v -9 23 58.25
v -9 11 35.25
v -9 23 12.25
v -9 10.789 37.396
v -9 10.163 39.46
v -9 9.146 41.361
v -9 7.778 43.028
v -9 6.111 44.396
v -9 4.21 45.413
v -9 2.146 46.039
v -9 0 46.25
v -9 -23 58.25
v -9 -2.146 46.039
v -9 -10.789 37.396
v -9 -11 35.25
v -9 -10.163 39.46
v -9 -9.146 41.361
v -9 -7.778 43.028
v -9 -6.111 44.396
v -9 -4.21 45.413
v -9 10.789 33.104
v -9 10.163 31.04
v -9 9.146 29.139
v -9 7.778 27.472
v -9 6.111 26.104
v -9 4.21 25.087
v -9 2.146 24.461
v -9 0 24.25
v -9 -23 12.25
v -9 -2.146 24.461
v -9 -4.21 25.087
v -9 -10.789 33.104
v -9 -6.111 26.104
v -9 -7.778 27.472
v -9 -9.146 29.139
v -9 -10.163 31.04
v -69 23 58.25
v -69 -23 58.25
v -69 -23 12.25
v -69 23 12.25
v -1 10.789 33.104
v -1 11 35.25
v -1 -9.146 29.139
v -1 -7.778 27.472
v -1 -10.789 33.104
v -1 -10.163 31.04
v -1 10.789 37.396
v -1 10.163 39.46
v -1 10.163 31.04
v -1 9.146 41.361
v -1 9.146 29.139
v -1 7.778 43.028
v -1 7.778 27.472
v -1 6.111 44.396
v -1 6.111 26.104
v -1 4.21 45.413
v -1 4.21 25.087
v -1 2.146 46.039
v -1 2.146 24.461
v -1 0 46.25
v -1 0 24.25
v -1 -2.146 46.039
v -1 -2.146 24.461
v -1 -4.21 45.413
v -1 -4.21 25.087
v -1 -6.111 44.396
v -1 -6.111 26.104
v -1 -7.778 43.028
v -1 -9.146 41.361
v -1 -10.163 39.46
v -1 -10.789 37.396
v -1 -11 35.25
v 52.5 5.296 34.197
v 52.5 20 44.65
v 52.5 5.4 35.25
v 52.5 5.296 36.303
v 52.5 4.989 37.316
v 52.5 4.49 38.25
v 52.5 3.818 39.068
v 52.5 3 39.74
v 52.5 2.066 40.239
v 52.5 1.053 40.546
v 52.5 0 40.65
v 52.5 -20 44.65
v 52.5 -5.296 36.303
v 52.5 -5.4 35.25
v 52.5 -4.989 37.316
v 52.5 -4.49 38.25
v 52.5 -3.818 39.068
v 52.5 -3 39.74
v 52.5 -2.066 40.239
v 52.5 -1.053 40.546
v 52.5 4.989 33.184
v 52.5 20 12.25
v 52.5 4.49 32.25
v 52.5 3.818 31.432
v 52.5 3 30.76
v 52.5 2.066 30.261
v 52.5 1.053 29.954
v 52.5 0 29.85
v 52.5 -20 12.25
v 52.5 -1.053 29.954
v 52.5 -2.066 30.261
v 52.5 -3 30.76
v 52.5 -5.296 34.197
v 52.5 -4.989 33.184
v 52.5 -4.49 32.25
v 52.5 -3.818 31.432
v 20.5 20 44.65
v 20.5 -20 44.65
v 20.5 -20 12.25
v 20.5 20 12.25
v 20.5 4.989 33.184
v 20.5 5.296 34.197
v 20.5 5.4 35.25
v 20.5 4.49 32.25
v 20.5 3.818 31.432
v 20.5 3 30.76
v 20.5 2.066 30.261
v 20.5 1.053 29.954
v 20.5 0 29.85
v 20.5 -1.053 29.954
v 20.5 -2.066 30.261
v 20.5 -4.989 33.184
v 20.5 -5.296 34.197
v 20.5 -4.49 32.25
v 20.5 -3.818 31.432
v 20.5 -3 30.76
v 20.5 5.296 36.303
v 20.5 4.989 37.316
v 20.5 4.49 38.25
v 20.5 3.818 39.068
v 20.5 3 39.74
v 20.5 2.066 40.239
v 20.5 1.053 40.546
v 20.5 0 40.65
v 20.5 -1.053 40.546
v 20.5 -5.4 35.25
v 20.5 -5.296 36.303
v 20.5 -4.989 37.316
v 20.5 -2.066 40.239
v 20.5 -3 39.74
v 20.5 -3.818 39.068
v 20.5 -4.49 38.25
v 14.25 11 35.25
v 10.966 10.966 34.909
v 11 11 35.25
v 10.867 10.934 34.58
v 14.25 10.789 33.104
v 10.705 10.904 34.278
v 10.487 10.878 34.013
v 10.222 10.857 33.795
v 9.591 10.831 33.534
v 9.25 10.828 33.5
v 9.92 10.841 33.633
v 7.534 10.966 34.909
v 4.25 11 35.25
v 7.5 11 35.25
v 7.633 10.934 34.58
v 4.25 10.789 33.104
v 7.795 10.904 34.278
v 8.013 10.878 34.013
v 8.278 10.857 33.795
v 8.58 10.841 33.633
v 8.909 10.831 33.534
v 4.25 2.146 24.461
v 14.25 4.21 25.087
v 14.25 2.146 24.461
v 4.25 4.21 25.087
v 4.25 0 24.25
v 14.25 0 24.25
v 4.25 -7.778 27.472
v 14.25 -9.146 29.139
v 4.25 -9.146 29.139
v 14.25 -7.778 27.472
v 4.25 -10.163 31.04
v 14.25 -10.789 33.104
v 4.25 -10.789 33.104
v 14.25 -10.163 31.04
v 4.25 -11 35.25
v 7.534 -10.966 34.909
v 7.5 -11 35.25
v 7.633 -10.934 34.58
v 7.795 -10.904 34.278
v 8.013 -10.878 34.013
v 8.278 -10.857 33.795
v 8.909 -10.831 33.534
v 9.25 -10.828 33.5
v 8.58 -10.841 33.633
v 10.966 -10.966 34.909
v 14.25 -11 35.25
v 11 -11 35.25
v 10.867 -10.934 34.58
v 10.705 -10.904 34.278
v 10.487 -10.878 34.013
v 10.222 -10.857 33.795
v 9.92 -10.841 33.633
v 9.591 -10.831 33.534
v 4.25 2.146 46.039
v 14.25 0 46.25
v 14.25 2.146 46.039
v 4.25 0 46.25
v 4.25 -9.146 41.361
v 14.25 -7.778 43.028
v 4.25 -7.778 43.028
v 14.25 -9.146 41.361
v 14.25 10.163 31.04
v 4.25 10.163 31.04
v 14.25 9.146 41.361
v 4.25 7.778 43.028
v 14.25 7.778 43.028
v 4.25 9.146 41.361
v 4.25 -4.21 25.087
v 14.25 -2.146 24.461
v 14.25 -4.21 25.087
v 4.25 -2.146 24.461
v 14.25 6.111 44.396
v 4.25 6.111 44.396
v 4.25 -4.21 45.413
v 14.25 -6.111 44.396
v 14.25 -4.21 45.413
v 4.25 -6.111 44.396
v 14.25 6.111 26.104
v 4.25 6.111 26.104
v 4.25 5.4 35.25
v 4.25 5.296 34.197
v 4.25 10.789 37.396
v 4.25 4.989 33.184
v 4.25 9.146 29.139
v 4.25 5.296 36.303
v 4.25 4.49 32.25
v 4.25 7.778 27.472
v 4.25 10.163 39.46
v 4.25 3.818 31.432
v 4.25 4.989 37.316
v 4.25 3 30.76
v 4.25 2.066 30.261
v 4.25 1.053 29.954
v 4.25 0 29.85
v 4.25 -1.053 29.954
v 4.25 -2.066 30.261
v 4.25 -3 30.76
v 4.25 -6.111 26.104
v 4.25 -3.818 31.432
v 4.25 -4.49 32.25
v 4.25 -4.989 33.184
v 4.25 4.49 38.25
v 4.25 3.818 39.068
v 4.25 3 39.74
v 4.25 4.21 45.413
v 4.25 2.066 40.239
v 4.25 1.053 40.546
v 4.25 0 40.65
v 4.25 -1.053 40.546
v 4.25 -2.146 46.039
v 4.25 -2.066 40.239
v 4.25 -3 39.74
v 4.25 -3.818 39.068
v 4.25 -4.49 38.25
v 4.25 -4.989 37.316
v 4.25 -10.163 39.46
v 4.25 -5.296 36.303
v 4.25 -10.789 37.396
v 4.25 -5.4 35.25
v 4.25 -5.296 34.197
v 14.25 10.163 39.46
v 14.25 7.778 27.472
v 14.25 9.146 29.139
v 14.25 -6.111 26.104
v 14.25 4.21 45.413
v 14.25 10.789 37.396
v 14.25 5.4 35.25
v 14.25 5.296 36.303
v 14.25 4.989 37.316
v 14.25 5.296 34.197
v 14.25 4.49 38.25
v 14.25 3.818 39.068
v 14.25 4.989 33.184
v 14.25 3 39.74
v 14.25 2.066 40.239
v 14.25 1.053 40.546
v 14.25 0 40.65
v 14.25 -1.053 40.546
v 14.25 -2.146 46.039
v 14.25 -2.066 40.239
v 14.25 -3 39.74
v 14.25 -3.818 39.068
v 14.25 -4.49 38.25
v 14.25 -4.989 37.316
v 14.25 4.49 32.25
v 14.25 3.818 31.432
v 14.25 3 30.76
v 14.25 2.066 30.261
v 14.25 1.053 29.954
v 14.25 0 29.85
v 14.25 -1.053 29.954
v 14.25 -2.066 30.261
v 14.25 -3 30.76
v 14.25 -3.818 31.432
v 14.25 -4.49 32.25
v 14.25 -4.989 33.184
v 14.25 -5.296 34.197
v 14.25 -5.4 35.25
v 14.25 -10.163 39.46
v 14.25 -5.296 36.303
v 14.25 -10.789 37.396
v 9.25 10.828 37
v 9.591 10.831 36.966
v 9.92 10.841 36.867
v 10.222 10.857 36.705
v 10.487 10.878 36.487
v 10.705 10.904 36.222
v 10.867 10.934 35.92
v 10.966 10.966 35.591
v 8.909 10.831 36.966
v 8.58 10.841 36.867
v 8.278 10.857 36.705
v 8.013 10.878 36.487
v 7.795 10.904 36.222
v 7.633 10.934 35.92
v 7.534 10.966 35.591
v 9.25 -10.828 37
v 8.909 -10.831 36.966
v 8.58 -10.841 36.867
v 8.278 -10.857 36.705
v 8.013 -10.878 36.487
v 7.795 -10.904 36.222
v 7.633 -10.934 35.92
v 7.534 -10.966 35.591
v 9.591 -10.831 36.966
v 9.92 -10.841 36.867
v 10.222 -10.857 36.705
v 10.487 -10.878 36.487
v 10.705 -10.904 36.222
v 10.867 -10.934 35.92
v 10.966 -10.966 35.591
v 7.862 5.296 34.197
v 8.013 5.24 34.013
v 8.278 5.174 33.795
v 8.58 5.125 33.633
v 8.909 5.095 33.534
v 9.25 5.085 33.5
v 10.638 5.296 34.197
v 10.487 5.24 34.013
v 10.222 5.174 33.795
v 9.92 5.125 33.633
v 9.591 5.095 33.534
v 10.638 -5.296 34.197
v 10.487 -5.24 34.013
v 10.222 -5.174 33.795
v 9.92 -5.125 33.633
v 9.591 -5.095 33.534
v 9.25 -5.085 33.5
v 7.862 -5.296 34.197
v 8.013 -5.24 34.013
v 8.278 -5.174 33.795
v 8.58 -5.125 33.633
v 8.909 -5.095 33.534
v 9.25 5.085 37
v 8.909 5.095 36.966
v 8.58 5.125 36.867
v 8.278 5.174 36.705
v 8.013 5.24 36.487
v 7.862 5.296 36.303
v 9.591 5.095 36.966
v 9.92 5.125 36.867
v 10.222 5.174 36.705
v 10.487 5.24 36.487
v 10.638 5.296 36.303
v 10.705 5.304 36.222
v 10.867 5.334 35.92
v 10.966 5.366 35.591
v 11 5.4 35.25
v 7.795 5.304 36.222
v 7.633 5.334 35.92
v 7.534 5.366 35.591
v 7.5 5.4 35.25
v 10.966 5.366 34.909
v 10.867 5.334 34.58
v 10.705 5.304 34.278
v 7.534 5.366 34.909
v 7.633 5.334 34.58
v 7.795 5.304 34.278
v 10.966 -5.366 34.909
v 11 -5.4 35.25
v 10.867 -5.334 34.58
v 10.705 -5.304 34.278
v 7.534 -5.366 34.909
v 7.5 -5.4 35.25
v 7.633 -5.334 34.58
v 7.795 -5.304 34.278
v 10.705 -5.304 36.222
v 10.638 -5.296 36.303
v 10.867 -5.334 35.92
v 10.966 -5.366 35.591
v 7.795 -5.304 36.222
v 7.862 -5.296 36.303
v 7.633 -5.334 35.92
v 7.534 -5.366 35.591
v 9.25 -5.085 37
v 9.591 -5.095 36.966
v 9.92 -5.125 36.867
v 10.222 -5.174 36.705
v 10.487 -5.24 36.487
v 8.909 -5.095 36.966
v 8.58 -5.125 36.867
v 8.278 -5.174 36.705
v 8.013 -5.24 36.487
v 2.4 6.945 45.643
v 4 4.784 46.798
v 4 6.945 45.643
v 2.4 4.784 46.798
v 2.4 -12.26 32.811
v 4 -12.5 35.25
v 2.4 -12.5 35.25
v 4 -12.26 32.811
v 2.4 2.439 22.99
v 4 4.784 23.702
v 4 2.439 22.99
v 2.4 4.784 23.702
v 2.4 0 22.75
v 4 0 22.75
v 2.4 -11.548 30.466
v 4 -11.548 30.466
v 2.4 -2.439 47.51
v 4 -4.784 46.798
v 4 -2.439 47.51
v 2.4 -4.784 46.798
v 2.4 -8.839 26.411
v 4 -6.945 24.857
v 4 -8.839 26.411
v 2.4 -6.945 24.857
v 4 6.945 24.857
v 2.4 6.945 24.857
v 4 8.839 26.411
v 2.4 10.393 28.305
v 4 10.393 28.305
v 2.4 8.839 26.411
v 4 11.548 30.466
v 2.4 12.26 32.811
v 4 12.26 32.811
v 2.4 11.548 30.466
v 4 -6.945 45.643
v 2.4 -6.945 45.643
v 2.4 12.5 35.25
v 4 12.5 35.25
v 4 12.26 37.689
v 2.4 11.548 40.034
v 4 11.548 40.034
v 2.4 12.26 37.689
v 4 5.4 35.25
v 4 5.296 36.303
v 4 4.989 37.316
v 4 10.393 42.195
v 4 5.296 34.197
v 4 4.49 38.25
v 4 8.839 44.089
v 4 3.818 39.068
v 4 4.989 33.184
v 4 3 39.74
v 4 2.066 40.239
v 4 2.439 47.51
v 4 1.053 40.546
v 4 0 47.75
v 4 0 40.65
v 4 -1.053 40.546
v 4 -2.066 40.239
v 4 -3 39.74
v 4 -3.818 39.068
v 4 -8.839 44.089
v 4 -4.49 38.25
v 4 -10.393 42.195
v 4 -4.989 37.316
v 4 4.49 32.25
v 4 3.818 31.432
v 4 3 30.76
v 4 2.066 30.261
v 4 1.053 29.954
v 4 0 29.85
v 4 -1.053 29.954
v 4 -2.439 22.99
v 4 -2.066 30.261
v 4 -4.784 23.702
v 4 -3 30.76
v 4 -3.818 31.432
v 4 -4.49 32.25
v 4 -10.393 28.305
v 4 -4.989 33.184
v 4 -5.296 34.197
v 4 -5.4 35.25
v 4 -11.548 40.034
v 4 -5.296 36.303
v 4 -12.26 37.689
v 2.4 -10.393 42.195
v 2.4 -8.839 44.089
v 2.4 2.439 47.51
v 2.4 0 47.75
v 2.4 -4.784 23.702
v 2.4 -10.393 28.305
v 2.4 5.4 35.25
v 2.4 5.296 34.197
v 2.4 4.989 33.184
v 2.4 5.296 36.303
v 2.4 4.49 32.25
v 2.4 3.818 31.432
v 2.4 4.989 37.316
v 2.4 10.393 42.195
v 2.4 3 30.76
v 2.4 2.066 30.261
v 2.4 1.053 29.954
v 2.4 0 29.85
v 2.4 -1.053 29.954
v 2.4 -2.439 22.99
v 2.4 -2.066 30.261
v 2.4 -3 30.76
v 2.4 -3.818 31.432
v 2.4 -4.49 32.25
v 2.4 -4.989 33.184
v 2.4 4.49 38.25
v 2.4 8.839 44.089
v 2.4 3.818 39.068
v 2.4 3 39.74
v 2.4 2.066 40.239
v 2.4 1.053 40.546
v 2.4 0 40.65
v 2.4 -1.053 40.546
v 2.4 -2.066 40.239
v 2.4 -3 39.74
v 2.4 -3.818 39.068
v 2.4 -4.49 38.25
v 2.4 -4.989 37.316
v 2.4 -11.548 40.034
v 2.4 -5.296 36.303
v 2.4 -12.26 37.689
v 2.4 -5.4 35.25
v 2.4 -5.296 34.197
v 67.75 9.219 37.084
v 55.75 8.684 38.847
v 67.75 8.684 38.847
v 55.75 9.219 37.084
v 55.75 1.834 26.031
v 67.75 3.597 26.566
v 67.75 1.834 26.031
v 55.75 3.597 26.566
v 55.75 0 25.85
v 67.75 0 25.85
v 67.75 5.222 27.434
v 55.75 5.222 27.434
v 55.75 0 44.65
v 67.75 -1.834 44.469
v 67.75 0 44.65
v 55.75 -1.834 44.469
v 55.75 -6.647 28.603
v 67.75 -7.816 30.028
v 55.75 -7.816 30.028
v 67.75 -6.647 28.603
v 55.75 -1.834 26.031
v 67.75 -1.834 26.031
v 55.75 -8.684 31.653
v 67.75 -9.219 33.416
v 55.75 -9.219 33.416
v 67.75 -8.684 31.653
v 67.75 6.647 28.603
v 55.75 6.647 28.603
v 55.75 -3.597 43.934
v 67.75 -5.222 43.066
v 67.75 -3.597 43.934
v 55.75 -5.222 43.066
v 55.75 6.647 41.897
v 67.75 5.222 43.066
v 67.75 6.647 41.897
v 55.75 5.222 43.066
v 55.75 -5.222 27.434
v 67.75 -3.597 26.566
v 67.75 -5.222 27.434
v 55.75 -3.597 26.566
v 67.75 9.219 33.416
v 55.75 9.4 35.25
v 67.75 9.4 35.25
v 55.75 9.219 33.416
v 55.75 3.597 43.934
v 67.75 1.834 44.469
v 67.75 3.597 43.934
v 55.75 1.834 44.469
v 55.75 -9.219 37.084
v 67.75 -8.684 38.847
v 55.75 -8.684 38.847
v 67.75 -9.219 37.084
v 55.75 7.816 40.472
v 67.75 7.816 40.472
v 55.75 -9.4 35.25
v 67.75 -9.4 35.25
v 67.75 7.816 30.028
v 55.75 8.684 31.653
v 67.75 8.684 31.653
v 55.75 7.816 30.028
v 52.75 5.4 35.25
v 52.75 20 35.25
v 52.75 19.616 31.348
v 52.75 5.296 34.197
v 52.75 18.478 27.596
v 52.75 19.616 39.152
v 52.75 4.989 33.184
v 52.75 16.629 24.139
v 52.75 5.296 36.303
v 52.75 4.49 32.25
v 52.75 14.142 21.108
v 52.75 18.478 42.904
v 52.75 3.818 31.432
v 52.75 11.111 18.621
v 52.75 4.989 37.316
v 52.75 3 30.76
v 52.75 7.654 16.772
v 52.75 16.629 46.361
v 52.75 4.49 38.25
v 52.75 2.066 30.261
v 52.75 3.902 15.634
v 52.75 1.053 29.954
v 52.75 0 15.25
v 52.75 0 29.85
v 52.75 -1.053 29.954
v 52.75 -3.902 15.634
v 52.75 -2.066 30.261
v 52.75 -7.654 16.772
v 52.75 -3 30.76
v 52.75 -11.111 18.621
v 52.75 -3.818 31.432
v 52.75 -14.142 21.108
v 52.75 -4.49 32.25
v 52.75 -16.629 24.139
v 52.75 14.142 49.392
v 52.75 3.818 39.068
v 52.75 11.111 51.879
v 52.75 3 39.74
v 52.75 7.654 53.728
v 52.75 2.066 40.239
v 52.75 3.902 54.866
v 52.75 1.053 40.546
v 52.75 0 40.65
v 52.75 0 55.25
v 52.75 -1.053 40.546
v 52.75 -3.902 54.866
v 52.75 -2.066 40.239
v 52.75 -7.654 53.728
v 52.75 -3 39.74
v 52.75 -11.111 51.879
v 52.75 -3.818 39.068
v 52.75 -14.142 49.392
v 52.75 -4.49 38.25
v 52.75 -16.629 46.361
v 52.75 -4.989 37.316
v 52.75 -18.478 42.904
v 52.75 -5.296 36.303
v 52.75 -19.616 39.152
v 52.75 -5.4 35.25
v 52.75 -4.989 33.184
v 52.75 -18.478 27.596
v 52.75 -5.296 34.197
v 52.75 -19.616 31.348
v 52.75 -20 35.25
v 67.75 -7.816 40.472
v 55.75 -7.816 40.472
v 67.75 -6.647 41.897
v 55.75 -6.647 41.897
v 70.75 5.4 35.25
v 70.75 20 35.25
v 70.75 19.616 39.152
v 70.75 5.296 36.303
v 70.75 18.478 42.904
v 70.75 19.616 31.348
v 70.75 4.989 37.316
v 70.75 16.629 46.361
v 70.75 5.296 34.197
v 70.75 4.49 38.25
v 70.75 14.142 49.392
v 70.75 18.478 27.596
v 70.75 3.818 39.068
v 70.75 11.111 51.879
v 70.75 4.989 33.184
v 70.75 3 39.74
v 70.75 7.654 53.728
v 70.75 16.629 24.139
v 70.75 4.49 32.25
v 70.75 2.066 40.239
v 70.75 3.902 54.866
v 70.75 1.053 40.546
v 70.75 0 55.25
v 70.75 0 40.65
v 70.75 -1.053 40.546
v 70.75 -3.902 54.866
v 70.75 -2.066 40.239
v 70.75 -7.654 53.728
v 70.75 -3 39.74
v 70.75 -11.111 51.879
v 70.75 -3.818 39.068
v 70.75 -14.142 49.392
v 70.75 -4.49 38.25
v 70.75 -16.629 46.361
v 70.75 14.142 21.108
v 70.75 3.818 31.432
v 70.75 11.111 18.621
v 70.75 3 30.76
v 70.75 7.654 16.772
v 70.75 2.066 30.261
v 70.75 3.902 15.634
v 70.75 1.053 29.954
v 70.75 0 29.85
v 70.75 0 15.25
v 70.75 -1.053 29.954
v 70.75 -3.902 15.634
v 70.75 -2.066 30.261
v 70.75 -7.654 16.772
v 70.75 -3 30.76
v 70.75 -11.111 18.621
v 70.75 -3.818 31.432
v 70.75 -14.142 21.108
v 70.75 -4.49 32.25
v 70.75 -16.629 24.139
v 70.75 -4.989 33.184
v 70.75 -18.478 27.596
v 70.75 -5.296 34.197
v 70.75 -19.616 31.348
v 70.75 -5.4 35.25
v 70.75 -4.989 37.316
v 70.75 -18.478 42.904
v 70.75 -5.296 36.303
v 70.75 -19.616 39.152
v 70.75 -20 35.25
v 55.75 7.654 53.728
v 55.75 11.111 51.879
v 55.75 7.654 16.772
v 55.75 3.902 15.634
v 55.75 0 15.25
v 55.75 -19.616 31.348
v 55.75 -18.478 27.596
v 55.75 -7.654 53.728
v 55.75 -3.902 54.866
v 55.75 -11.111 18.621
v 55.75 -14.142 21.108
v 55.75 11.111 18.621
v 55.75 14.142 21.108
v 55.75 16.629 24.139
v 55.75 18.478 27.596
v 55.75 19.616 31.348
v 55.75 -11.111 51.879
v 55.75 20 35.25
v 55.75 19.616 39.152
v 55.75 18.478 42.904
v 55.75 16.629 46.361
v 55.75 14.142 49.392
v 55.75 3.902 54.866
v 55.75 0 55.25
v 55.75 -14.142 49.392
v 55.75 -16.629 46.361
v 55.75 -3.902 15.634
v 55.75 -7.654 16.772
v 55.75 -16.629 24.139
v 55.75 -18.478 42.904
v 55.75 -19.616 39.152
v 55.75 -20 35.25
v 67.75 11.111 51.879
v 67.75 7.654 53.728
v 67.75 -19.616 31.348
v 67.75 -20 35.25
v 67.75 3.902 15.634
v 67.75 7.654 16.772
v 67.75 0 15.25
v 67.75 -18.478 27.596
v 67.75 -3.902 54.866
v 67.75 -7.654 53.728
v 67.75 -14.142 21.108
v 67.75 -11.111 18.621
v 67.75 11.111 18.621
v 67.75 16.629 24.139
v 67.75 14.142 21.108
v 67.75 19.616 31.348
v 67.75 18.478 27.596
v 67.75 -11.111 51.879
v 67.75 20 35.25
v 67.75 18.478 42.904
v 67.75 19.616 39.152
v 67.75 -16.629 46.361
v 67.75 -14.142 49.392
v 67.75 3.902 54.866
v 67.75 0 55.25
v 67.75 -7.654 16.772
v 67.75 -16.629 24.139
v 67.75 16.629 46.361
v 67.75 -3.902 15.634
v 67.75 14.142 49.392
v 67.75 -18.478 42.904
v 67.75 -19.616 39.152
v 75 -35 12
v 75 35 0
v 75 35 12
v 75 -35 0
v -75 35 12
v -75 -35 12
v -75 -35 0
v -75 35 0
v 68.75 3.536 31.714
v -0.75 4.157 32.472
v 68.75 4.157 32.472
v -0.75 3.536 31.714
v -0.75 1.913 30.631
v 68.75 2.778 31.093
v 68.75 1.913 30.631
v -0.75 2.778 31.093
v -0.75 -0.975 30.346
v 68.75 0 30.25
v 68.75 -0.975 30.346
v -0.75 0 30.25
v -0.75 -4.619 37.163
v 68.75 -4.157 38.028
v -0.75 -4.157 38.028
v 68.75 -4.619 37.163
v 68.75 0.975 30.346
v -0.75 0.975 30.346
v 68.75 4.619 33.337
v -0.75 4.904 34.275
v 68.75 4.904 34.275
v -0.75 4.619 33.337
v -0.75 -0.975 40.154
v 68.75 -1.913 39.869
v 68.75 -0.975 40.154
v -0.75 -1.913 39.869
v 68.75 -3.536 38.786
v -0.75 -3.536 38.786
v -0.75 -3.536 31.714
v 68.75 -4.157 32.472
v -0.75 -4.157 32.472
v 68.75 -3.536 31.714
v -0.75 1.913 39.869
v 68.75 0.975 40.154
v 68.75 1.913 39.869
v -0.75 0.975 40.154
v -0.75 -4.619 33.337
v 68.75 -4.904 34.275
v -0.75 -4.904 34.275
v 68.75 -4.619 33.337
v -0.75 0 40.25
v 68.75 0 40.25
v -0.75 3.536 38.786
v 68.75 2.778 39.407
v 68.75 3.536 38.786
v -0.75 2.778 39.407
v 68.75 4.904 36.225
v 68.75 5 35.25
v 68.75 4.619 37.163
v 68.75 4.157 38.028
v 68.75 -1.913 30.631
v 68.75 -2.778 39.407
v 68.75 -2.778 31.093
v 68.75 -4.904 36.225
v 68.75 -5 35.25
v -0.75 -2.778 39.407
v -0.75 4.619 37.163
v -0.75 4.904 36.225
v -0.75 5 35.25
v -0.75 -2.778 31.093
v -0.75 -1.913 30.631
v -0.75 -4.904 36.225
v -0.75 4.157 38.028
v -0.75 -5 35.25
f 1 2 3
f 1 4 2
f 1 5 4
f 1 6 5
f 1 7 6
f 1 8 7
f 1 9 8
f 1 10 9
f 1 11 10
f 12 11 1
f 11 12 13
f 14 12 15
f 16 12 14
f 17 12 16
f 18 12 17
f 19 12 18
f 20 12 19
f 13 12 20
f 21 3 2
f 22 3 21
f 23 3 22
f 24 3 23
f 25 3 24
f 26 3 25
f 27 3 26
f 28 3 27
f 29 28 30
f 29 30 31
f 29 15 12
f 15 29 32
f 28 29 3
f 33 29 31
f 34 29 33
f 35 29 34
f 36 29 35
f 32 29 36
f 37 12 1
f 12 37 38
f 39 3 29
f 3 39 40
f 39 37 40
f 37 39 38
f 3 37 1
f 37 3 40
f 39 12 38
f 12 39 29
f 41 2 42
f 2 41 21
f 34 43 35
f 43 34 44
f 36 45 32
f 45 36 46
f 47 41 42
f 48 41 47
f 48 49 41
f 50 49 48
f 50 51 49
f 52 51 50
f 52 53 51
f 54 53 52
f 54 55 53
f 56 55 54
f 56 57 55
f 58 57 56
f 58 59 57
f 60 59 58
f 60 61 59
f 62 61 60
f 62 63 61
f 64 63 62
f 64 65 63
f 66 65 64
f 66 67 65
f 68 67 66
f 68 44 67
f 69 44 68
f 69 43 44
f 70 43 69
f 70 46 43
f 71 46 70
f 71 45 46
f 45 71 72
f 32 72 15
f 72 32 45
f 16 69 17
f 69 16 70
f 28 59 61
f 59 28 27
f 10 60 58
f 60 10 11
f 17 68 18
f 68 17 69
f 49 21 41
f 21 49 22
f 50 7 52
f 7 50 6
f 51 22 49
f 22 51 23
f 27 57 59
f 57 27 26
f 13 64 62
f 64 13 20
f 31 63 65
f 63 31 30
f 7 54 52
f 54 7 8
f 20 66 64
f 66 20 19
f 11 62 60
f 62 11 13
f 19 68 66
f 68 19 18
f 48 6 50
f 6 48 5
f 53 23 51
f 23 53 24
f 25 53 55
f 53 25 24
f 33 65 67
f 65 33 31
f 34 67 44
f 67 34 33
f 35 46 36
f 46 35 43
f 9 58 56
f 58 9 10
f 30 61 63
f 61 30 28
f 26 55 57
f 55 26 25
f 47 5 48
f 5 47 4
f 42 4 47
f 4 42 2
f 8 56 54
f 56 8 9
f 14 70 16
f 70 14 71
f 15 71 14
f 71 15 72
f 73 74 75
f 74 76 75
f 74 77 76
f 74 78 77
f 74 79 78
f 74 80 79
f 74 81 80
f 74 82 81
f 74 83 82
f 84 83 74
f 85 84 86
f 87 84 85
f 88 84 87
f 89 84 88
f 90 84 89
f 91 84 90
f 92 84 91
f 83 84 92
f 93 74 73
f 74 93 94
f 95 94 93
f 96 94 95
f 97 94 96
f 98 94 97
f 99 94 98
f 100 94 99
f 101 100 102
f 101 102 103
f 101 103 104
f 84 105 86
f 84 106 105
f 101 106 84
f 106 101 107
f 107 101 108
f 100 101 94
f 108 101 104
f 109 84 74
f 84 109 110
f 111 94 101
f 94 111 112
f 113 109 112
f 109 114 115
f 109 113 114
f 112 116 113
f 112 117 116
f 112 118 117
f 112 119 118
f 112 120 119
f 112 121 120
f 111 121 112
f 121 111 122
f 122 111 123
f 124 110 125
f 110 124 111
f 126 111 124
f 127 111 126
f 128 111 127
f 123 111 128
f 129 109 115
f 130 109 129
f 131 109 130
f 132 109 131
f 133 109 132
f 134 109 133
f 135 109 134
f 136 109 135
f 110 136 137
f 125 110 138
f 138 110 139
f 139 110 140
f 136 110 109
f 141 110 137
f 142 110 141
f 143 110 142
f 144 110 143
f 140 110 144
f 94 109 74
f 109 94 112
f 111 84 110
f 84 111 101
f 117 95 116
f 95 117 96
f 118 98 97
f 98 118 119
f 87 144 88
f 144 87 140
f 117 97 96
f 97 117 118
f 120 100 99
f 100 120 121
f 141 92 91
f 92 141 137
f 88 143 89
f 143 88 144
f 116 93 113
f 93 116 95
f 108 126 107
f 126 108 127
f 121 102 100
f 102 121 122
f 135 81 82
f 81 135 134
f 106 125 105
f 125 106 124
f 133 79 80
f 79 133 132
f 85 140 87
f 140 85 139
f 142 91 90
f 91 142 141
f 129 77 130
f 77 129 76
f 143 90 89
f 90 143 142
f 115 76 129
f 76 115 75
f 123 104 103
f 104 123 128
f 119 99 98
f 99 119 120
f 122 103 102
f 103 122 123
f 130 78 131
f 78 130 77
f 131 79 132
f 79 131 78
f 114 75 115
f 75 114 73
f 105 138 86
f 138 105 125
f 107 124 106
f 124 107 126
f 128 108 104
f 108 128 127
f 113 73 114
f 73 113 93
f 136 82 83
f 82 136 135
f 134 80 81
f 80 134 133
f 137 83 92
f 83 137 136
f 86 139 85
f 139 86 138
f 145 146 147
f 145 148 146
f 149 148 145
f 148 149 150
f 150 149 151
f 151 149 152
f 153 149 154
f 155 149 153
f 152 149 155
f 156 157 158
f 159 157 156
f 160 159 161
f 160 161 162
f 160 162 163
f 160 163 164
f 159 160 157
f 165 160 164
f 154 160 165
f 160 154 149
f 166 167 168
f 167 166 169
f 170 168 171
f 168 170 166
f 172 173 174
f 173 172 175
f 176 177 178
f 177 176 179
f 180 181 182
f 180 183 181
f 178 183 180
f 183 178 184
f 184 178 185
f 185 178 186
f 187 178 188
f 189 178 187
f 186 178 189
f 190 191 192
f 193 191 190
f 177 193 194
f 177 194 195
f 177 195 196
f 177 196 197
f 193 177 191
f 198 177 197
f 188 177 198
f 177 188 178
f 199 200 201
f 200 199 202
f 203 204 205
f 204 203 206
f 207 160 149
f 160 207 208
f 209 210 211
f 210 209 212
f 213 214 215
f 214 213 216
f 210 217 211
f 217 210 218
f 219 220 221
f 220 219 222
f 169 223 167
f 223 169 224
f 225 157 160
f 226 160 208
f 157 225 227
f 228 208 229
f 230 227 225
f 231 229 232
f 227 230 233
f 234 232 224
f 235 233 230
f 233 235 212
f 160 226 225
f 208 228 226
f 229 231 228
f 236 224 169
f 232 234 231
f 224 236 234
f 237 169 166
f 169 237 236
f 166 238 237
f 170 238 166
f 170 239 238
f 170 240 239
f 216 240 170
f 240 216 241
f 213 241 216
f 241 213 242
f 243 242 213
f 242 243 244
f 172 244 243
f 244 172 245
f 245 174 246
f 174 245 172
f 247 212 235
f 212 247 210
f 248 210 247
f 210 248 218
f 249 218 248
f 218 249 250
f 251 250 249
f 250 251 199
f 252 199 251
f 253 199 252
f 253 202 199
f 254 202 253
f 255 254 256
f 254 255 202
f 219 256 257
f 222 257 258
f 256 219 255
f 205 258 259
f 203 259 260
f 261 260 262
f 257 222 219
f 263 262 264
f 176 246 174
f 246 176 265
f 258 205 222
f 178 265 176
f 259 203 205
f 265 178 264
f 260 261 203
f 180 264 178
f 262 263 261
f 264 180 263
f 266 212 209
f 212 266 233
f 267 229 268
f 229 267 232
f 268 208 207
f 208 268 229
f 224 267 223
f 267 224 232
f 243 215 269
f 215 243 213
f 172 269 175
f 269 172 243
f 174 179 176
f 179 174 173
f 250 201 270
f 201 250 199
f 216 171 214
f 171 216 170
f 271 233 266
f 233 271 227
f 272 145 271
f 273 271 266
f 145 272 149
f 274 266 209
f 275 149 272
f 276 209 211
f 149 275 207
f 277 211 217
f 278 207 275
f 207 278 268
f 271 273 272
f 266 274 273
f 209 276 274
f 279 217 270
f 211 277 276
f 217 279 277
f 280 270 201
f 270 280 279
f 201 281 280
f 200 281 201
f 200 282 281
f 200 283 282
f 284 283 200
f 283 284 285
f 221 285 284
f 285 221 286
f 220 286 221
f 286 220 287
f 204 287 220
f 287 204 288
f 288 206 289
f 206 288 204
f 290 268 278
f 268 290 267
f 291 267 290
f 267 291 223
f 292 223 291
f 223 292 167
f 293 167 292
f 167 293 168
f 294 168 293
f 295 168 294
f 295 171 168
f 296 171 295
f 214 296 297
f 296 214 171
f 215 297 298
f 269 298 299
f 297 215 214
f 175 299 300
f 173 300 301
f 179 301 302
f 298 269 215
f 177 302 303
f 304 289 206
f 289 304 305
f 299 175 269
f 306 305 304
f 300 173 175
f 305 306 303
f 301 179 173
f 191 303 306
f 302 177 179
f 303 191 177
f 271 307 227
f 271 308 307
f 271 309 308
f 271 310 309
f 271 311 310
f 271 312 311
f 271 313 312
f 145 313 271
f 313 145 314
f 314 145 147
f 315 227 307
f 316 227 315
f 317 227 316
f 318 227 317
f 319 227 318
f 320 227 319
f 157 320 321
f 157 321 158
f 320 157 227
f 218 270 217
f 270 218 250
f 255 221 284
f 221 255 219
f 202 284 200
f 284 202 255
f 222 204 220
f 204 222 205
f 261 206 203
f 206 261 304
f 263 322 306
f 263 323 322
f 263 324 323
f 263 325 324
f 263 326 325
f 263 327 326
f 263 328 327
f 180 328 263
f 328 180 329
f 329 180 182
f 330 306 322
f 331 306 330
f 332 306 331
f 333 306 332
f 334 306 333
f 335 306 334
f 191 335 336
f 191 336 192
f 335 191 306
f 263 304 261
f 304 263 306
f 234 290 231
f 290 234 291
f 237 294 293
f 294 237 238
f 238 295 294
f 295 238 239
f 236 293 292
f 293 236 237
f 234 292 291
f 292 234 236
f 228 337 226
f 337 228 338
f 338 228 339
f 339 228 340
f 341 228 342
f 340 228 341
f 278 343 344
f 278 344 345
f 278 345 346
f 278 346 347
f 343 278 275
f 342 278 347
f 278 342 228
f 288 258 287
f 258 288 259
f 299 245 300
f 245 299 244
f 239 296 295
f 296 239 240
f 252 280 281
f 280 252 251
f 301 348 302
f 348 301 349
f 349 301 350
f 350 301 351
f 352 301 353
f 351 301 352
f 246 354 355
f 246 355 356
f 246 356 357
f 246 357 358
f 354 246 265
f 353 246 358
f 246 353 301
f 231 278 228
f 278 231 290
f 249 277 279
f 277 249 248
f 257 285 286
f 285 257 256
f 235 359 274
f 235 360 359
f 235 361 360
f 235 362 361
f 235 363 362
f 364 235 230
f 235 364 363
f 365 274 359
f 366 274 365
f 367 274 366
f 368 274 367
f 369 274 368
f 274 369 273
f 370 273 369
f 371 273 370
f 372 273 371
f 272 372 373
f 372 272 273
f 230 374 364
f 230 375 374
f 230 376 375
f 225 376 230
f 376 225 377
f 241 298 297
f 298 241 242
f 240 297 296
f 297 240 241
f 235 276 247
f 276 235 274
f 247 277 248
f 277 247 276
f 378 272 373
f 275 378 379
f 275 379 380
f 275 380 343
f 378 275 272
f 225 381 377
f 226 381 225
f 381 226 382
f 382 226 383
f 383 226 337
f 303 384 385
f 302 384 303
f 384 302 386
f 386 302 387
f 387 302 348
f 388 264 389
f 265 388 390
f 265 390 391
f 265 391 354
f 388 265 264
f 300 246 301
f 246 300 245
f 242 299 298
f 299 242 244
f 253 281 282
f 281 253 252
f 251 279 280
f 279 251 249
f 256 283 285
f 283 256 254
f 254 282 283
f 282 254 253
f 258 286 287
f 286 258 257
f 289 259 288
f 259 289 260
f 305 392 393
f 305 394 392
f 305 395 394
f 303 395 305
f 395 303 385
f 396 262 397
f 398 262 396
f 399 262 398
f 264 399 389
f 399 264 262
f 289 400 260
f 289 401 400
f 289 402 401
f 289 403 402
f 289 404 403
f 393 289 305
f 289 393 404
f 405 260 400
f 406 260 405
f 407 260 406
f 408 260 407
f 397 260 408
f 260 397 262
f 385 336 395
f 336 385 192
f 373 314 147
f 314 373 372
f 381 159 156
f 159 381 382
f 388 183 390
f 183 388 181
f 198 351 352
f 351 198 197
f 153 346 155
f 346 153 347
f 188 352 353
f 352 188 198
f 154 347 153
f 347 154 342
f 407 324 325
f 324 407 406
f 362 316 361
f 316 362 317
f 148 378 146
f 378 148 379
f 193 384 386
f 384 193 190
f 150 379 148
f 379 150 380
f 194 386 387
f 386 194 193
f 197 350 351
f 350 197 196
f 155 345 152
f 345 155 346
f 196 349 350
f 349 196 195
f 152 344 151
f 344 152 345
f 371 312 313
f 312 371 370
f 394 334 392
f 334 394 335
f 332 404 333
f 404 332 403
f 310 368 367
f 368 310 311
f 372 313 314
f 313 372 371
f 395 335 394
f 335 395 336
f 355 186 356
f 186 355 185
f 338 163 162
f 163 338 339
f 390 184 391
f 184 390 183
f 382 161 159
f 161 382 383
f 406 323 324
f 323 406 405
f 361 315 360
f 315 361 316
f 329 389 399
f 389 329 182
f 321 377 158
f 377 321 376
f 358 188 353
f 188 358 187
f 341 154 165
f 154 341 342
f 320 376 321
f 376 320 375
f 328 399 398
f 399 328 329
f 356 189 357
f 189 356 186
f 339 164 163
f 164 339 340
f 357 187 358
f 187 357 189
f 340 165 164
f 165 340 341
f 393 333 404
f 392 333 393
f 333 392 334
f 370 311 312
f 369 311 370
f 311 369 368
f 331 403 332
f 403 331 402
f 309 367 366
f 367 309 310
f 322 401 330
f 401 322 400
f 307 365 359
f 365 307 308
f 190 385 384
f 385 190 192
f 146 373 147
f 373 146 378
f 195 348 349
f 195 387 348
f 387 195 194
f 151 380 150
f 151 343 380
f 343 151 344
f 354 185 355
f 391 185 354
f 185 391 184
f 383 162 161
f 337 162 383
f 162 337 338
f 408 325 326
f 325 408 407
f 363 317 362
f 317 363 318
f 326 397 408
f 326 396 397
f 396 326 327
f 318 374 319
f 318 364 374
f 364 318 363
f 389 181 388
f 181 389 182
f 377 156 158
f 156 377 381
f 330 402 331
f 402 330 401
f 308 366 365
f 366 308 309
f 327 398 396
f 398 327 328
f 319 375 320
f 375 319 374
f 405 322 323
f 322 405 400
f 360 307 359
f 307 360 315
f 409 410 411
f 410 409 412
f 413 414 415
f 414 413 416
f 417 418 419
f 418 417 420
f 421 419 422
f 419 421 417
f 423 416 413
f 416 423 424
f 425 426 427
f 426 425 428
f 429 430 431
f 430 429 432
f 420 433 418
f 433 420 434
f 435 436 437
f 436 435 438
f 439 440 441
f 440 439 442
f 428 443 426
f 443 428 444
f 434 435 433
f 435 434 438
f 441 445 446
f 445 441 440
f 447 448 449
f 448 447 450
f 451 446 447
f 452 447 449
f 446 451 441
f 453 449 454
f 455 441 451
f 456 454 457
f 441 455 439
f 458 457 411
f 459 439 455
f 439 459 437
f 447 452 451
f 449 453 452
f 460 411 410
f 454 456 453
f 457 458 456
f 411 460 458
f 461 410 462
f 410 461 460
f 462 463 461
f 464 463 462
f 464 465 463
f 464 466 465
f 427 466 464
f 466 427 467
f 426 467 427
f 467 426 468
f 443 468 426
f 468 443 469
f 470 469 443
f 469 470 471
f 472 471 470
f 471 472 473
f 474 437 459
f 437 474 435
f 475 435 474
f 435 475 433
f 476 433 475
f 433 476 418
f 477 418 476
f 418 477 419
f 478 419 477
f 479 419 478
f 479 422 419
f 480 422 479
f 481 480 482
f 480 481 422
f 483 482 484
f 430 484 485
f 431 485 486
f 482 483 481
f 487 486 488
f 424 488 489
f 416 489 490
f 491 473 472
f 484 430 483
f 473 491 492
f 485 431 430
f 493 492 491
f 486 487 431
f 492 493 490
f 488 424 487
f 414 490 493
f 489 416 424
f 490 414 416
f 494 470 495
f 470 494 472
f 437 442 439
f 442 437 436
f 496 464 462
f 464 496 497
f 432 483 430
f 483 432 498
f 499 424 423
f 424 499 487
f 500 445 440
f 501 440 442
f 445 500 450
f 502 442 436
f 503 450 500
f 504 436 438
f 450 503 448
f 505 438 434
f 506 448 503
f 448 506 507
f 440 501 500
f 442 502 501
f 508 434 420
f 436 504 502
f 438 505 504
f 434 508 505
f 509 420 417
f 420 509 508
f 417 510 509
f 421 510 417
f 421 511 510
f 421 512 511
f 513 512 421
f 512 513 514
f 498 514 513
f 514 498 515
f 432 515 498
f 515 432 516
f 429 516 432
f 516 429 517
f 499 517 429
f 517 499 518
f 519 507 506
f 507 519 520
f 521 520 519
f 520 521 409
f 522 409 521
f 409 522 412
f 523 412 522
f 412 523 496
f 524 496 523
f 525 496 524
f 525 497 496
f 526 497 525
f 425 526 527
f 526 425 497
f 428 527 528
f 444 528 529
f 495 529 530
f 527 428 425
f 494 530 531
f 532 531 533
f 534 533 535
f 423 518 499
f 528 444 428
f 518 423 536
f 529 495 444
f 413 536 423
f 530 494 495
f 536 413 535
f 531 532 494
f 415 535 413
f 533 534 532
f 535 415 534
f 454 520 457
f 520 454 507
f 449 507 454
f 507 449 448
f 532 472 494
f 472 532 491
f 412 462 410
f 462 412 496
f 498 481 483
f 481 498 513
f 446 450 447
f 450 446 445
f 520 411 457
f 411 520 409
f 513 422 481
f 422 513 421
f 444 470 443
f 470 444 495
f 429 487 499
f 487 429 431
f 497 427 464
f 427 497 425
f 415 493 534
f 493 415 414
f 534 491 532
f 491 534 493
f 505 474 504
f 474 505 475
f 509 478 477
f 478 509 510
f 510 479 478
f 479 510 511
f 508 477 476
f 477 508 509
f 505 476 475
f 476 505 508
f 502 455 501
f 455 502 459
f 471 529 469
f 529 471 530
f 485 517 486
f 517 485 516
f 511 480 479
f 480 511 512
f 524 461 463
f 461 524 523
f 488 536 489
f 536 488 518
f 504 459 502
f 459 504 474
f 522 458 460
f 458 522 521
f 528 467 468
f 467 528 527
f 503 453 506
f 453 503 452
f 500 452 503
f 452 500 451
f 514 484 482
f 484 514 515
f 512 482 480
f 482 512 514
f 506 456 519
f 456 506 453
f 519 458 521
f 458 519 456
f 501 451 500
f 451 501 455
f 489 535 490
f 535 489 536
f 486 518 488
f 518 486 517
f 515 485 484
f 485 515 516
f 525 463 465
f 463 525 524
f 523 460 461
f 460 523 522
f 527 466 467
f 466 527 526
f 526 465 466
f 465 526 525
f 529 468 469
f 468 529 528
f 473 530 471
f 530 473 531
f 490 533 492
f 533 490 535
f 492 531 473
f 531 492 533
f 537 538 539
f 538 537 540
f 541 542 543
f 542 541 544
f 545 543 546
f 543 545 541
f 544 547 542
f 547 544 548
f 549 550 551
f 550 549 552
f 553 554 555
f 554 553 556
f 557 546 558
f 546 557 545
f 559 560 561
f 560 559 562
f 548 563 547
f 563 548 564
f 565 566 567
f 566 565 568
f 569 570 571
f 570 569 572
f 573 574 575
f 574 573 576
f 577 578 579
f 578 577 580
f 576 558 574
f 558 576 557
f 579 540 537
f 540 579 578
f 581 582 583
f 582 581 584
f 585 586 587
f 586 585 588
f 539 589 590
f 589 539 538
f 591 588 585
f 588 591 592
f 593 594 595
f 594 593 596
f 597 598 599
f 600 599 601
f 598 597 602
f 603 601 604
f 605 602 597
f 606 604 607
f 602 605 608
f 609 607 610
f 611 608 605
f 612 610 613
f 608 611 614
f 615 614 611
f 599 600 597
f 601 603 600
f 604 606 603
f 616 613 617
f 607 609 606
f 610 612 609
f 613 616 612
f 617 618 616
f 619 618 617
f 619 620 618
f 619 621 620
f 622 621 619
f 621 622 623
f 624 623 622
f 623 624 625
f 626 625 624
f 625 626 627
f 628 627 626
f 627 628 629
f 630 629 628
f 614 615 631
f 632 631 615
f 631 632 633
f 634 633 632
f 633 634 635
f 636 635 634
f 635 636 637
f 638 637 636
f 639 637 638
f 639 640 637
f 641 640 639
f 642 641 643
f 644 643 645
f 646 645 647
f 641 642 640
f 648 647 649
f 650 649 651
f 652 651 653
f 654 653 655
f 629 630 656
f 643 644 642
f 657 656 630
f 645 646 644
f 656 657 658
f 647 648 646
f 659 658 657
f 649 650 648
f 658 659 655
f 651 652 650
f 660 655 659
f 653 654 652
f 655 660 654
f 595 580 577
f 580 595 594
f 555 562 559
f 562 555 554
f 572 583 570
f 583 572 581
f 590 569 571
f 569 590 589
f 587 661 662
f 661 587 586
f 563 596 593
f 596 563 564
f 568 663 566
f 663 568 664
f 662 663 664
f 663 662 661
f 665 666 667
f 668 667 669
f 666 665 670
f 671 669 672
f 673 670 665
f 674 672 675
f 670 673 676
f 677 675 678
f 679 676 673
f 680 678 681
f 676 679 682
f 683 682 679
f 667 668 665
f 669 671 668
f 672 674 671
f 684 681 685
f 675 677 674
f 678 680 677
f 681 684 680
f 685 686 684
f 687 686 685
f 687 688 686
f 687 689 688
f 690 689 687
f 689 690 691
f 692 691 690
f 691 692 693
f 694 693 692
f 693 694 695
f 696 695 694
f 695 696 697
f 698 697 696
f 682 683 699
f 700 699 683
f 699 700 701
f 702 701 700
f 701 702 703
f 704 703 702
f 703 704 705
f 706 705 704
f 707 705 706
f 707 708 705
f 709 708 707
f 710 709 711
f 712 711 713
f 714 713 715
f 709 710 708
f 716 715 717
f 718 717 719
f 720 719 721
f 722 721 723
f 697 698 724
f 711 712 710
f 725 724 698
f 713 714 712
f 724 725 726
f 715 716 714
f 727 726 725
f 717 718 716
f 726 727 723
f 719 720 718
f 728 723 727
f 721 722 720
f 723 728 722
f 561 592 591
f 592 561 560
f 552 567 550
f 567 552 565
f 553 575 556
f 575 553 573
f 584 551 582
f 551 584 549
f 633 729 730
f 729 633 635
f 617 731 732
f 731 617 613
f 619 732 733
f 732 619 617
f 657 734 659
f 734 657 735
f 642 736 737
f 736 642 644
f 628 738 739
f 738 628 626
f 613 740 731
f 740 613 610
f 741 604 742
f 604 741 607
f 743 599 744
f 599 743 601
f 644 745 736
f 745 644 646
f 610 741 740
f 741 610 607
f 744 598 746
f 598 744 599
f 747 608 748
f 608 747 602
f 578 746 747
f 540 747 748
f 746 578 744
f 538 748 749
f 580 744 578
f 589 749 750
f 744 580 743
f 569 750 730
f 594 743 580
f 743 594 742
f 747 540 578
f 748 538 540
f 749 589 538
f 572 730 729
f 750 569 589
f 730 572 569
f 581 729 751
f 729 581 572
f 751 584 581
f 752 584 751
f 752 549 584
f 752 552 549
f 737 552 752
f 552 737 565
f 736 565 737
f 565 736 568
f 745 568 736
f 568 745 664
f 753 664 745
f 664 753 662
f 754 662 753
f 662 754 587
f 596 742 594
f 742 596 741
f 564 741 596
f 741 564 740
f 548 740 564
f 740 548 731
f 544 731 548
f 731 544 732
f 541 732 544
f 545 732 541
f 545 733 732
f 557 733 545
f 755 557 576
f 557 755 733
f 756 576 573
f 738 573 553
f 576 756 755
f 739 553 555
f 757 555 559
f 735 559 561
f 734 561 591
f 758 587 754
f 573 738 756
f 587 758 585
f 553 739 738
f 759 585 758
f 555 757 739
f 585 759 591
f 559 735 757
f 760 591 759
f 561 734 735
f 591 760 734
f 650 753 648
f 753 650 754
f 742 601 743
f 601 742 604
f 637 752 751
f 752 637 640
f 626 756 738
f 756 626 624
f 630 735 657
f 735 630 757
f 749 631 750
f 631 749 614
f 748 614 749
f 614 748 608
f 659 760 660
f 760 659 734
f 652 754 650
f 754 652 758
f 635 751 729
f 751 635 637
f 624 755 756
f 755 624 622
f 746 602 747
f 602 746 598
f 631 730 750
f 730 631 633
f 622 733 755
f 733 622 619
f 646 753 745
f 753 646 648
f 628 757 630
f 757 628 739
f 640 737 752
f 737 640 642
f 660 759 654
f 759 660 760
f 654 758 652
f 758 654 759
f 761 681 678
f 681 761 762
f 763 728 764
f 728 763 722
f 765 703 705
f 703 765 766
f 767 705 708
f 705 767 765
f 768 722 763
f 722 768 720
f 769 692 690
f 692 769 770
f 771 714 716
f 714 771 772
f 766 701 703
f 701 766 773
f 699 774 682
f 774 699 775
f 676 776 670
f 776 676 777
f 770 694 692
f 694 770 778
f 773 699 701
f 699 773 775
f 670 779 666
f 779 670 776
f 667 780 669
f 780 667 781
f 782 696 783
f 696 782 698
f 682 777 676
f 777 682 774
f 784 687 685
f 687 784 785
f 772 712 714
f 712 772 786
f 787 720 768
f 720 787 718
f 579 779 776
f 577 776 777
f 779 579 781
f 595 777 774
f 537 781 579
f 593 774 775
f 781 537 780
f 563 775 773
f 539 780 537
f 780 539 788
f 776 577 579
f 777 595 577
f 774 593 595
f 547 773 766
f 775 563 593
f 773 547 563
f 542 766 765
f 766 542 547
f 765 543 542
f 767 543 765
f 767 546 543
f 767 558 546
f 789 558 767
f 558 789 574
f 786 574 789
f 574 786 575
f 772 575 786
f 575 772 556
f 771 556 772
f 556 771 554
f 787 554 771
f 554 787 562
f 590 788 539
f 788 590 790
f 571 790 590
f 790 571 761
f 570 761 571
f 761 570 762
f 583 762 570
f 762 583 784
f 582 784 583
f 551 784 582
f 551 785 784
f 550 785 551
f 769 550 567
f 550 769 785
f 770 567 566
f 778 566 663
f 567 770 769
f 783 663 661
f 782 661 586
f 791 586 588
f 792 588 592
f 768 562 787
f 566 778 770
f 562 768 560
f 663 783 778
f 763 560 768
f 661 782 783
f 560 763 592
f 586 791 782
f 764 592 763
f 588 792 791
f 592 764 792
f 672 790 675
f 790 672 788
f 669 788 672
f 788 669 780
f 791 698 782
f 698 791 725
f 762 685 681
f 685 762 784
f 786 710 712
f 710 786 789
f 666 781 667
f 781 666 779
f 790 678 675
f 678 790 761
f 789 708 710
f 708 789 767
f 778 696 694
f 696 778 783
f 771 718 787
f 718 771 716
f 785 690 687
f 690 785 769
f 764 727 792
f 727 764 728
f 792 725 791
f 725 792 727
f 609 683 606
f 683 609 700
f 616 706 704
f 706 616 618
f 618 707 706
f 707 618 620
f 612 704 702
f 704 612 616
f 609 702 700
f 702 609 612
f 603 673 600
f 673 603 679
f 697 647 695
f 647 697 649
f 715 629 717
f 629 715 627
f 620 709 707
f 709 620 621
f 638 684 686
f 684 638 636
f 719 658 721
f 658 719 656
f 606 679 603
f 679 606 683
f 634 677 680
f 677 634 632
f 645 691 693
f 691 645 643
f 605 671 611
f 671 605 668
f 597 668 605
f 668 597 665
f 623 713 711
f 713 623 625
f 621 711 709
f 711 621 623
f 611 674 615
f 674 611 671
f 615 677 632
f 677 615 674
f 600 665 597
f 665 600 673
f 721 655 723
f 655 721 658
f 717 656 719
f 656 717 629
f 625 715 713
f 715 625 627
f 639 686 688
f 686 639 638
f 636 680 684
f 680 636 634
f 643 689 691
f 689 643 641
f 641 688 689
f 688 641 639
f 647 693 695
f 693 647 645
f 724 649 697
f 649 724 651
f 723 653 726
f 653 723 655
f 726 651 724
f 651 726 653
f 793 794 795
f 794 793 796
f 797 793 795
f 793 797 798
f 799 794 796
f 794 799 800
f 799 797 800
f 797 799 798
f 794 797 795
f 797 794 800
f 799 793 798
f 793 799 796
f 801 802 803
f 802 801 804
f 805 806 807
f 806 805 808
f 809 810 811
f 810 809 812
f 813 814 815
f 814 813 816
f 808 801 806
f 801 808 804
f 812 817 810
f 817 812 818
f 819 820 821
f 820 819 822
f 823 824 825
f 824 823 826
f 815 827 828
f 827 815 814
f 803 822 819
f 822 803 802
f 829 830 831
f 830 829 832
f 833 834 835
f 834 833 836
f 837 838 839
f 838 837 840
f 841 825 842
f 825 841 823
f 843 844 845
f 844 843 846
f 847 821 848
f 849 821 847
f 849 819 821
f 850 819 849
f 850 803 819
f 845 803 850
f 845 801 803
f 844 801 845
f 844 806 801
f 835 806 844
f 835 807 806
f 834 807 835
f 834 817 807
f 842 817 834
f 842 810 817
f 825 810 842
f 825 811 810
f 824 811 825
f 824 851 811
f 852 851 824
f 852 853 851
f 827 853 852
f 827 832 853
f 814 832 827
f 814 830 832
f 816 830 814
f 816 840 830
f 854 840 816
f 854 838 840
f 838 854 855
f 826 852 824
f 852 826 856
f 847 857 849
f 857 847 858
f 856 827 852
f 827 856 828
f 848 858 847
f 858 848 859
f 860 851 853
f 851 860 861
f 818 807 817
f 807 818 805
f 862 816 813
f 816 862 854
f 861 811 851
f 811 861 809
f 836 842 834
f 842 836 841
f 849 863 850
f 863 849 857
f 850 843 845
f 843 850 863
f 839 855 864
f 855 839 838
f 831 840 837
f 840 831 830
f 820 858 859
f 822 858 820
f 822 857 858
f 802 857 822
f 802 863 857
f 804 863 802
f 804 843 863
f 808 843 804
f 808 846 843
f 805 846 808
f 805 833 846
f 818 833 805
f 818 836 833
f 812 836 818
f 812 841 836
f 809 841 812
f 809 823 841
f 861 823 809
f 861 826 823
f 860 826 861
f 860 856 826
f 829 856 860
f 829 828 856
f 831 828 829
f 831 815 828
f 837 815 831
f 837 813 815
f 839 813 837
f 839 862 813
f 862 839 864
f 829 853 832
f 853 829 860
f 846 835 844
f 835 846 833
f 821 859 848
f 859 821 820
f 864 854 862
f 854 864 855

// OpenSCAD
$fn = 32;

// ------------------------------------------------------------------------
// Motor drive station: motor 60 x 46 mm, shaft d10, pulley d40
// Every part is its own module, assembly() places every instance.
// ------------------------------------------------------------------------

// --- part 1 ---
module station_bed() {
  difference() {
    translate([-75, -35, 0]) cube([150, 70, 12]);
  }
}

// --- part 2 ---
module drive_motor() {
  union() {
    translate([-30, -23, 0]) cube([60, 46, 46]);
    translate([34, 0, 23]) rotate([0, 90, 0]) cylinder(h = 8, d = 22, center = true);
  }
}

// --- part 3 ---
module pillow_block() {
  difference() {
    translate([-16, -20, 0]) cube([32, 40, 32.4]);
    translate([0, 0, 23]) rotate([0, 90, 0]) cylinder(h = 34, d = 10.8, center = true);
  }
}

// --- part 4 ---
module drive_shaft() {
  translate([0, 0, -34.75]) cylinder(h = 69.5, d = 10);
}

// --- part 5 ---
module shaft_collar() {
  difference() {
    cylinder(h = 10, d = 22);
    translate([0, 0, -1]) cylinder(h = 12, d = 10.8);
    translate([0, 0, 5]) rotate([90, 0, 0]) cylinder(h = 24, d = 3.5, center = true);
  }
}

// --- part 6 ---
module collar_washer() {
  difference() {
      translate([0, 0, 0]) cylinder(h = 1.6, d = 25);
      translate([0, 0, -1]) cylinder(h = 3.6, d = 10.8);
    }
}

// --- part 7 ---
module drive_pulley() {
  difference() {
    union() {
      cylinder(h = 18, d = 18.8);
      cylinder(h = 3, d = 40);
      translate([0, 0, 15]) cylinder(h = 3, d = 40);
    }
    translate([0, 0, -1]) cylinder(h = 20, d = 10.8);
  }
}

// --- assembly ---
module assembly() {
  color([0.80, 0.24, 0.20]) translate([0, 0, 0]) rotate([0, 0, 0]) station_bed();
  color([0.20, 0.45, 0.75]) translate([-39, 0, 12.25]) rotate([0, 0, 0]) drive_motor();
  color([0.25, 0.62, 0.32]) translate([36.5, 0, 12.25]) rotate([0, 0, 0]) pillow_block();
  color([0.92, 0.70, 0.18]) translate([34, 0, 35.25]) rotate([0, 90, 0]) drive_shaft();
  color([0.58, 0.35, 0.70]) translate([4.25, 0, 35.25]) rotate([0, 90, 0]) shaft_collar();
  color([0.16, 0.66, 0.66]) translate([2.4, 0, 35.25]) rotate([0, 90, 0]) collar_washer();
  color([0.85, 0.48, 0.18]) translate([52.75, 0, 35.25]) rotate([0, 90, 0]) drive_pulley();
}

assembly();
